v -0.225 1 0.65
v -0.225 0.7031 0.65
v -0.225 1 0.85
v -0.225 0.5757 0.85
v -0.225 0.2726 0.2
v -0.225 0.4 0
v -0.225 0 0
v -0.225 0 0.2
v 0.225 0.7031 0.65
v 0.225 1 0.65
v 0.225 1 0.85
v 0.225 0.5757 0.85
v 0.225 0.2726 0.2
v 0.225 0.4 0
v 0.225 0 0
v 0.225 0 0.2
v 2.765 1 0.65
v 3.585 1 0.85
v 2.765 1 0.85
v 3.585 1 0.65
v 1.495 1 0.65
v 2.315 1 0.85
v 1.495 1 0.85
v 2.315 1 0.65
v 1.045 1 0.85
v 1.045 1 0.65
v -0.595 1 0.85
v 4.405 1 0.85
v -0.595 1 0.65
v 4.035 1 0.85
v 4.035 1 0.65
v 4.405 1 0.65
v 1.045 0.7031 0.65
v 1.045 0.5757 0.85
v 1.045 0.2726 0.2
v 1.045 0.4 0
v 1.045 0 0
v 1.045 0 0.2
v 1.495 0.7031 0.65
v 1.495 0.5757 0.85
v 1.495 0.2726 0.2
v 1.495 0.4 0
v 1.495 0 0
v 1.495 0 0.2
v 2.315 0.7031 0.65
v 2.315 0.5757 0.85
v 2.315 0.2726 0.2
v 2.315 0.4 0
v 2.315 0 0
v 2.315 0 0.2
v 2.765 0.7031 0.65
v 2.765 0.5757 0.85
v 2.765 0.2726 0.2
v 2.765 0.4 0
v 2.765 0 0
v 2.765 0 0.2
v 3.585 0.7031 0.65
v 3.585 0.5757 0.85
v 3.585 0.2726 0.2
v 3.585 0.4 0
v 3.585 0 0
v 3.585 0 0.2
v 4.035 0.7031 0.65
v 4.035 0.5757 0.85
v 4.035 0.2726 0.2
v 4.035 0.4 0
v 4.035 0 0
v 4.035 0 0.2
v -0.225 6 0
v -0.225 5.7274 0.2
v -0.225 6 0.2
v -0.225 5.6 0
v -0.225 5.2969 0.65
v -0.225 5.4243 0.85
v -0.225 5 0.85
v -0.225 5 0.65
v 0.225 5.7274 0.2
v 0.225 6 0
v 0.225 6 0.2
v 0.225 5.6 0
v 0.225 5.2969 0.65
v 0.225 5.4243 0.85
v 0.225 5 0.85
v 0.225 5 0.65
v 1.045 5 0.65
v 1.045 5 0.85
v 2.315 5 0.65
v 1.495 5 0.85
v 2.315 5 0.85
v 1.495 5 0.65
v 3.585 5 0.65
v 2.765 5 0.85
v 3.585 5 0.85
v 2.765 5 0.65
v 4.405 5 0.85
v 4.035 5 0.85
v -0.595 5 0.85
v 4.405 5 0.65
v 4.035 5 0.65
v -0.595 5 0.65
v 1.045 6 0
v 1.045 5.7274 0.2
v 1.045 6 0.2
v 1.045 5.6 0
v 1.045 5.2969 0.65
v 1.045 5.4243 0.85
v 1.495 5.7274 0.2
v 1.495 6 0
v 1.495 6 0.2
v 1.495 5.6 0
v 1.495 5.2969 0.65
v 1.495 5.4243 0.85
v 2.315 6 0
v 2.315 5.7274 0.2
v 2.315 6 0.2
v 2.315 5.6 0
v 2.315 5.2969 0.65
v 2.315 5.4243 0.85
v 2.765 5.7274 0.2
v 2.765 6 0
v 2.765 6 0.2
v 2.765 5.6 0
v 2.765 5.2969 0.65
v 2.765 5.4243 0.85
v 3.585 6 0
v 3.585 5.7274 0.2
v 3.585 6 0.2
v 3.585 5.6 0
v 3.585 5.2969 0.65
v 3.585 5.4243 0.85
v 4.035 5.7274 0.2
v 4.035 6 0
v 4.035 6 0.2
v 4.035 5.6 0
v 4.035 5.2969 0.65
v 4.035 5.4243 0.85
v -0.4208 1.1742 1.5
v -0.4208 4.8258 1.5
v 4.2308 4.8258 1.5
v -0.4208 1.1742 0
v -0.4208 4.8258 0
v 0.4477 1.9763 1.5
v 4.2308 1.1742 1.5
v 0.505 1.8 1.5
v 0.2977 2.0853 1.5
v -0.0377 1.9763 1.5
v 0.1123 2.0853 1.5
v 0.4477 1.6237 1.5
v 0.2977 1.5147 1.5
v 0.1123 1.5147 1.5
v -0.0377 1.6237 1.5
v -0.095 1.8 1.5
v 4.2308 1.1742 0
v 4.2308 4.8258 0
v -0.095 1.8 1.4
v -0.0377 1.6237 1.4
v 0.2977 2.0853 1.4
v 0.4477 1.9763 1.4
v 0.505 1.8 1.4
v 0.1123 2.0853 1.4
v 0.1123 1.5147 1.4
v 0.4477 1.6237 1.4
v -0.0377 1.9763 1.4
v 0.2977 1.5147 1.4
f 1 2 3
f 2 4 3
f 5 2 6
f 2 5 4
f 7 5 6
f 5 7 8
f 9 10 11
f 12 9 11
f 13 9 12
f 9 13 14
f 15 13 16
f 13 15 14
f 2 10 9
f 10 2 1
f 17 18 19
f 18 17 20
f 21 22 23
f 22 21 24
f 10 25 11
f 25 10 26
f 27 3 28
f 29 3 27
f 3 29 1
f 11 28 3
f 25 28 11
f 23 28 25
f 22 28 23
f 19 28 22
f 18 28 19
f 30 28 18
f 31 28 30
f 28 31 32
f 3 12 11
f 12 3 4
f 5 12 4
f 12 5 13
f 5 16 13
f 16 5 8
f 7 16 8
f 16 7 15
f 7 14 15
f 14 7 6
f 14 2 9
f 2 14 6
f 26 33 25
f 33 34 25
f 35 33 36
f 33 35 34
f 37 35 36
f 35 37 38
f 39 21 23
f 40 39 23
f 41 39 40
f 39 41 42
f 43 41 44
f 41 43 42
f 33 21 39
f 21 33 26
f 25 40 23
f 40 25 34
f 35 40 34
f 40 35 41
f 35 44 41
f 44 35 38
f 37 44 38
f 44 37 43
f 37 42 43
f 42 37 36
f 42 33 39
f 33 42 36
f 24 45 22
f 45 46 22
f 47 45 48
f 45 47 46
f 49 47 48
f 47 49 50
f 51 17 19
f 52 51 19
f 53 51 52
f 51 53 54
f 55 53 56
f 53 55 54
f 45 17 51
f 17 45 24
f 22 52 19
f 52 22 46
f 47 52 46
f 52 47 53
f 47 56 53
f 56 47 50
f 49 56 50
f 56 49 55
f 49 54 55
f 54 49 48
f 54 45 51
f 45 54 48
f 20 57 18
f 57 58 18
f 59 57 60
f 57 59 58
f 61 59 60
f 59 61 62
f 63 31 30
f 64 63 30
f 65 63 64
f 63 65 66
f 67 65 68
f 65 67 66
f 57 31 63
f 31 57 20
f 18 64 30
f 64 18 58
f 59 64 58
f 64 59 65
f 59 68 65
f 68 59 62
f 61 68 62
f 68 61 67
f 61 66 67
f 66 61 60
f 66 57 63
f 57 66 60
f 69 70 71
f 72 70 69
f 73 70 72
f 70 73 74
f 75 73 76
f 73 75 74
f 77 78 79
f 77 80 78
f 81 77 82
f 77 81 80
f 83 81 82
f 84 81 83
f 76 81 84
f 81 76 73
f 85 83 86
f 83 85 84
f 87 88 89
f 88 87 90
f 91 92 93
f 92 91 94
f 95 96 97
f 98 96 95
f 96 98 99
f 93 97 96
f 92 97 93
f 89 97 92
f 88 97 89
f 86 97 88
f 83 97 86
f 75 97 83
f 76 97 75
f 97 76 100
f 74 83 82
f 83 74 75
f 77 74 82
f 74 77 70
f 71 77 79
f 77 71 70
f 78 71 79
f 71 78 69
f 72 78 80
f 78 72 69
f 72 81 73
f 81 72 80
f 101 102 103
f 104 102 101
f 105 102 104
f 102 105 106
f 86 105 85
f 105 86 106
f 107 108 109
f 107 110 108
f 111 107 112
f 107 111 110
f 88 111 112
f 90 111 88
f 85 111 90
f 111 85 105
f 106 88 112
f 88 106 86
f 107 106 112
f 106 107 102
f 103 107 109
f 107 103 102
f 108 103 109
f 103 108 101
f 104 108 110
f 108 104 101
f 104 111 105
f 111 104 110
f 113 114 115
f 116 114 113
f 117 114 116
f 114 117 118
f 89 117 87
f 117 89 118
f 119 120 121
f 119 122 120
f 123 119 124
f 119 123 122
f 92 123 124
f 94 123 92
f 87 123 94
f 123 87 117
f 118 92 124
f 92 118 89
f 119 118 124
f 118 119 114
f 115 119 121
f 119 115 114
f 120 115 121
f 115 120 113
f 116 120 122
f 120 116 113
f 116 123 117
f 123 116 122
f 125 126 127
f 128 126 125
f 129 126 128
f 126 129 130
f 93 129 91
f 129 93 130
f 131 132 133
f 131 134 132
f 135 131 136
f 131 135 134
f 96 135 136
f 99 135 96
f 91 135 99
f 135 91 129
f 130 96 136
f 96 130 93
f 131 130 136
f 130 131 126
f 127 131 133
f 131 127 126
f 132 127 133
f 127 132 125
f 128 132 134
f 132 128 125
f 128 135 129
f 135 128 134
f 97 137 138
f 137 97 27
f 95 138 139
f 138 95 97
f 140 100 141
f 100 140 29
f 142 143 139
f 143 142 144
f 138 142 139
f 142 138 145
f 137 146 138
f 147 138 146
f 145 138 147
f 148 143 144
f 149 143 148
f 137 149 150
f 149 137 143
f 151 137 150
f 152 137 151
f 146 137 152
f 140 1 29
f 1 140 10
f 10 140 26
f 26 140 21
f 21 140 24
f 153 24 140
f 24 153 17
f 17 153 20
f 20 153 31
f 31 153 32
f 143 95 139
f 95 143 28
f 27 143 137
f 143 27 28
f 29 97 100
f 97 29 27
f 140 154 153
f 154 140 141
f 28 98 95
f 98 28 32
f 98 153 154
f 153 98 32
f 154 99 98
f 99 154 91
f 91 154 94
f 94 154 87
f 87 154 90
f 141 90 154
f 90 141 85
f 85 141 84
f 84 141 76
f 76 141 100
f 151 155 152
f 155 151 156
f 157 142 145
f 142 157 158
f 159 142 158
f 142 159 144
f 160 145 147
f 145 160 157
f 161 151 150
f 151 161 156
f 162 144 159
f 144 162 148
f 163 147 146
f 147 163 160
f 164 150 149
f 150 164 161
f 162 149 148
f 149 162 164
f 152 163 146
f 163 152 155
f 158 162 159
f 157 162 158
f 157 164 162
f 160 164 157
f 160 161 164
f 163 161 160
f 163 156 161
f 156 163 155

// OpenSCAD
// file: pin.scad
// This module outputs bended pin
// _L - whole pin length
// _l - length of bottom part
// _H - whole pin height
// _th - pin thickness
// _a - bending angle
// _W - pin width
module pin(_L,_l,_H,_th,_a,_W)
{
	// Internal variables
    _d1 = _th*sin(_a) / (1-cos(_a));
    _d2 = (_th-_H)*cos(_a) / sin(_a);

	rotate([90,0,90])
    // Extrude the following polygon
	linear_extrude(height = _W, center = true, convexity = 10, twist = 0)
        polygon([[0,0],
                 [_l,0],
				 [_l+_d2,_H-_th],
				 [_L,_H-_th],
				 [_L,_H],
				 [_l+_d2-_d1,_H],
				 [_l-_d1,_th],
				 [0,_th]]);
}

// Example of usage
pin(2,1,1,0.2,115,0.5);
// file: case.scad
// This module draws case
// _L - case length
// _W - case width
// _H - case height
// _ph - top point (vertical) of pin connection area
// _pt - pin thickness
// _atl - case angle top left,
// _atr - case angle top right,
// _atu - case angle top up
// _atd - case angle top down
// _abl - case angle bottom left,
// _abr - case angle bottom right,
// _abu - case angle bottom up
// _abd - case angle bottom down
// _n_x - notch X position relative to case corner
// _n_y - notch Y position relative to case corner
// _n_d - notch diameter
// _n_z - notch_depth
module case(_L,_W,_H,_ph,_pt,_atl,_atr,_atu,_atd,_abl,_abr,_abu,_abd, _n_x, _n_y, _n_d, _n_z)
{
    _tth = _H - _ph;
    _bth = _ph - _pt;
    _dtl = _tth * cos(_atl) / sin(_atl);
    _dtr = _tth * cos(_atr) / sin(_atr);
    _dtu = _tth * cos(_atu) / sin(_atu);
    _dtd = _tth * cos(_atd) / sin(_atd);
    _dbl = _bth * cos(_abl) / sin(_abl);
    _dbr = _bth * cos(_abr) / sin(_abr);
    _dbu = _bth * cos(_abu) / sin(_abu);
    _dbd = _bth * cos(_abd) / sin(_abd);
	// Make case with notch - difference between case and small cylinder
    difference()
    {
        // This is our case
        polyhedron(
            points = [
                // top points
                [ 0 + _dtl, 0 + _dtd, _H],
                [_L - _dtr, 0 + _dtd, _H],
                [_L - _dtr,_W - _dtu, _H],
                [ 0 + _dtl,_W - _dtu, _H],
                // middle top points
                [ 0, 0,_ph],
                [_L, 0,_ph],
                [_L,_W,_ph],
                [ 0,_W,_ph],
                // middle bottom points
                [ 0, 0,_ph - _pt],
                [_L, 0,_ph - _pt],
                [_L,_W,_ph - _pt],
                [ 0,_W,_ph - _pt],
                // bottom points
                [ 0 + _dbl, 0 + _dbd, 0],
                [_L - _dbr, 0 + _dbd, 0],
                [_L - _dbr,_W - _dbu, 0],
                [ 0 + _dbl,_W - _dbu, 0]
            ],
            triangles = [
                // Top
                [ 0, 3, 2, 1],
                // Top sides
                [ 4, 0, 1, 5],
                [ 5, 1, 2, 6],
                [ 6, 2, 3, 7],
                [ 7, 3, 0, 4],
                // Middle sides
                [ 4, 5, 9, 8],
                [ 5, 6,10, 9],
                [ 6, 7,11,10],
                [ 7, 4, 8,11],
                // Bottom sides
                [12, 8, 9,13],
                [13, 9,10,14],
                [14,10,11,15],
                [15,11, 8,12],
                // Bottom
                [12,13,14,15]
            ]
        );
        // This is notch
        translate([_n_x,_n_y,_H])
            cylinder(r = _n_d/2, h = _n_z*2, center = true, $fn=10);
    }
}

// Example of usage
// case(10,5,1.5,0.7,0.3,80,80,80,80,45,45,45,45, 1,1,1);
// main file
use <case.scad>
use <pin.scad>

case_z = 1.5;
case_x = 5;
case_y = 4;
case_a = 75;

notch_d=0.6;
notch_depth=0.1;
notch_x=0.8;
notch_y=0.8;

side1_pins = 4;
side2_pins = 0;
side3_pins = 4;
side4_pins = 0;
pin_distance = 1.27;

pin_th = 0.2;
pin_W = 0.45;
pin_L = 1;
pin_H = case_z/2+pin_th/2;
pin_l = 0.4;
pin_a = 115;

// Array of pins
// _cnt - number of pins
// _distance - distance between pin centres
module pins_array(_cnt, _distance)
{
	if (_cnt>0)
	{
		for (_i = [0:_cnt-1])
		{
			translate([_distance*_i,0,0])
				pin(pin_L,pin_l,pin_H,pin_th,pin_a,pin_W);
		}
	}
}

// Complete model
union()
{
	// Top pins
	translate([(side1_pins-side3_pins)*pin_distance/2,case_y+pin_L*2,0])
		mirror([0,1,0])
			pins_array(side3_pins, pin_distance);

	// Bottom pins
	pins_array(side1_pins, pin_distance);

	// Left pins
	translate([-(case_x-(side1_pins-1)*pin_distance)/2 - pin_L,pin_L+case_y/2-(side4_pins-1)*pin_distance/2,0])
		mirror([1,0,0])
			rotate([0,0,90])
				pins_array(side4_pins, pin_distance);

	// Right pins
	translate([-(case_x-(side1_pins-1)*pin_distance)/2-pin_L+case_x+2*pin_L,pin_L+case_y/2-(side2_pins-1)*pin_distance/2,0])
		mirror([0,1,0])
			mirror([0,1,0])
				rotate([0,0,90])
					pins_array(side2_pins, pin_distance);

	// Case
	translate([-(case_x-(side1_pins-1)*pin_distance)/2,pin_L,0])
		case(case_x,case_y,case_z,pin_H,pin_th,case_a,case_a,case_a,case_a,case_a,case_a,case_a,case_a, notch_x,notch_y,notch_d,notch_depth);
}
